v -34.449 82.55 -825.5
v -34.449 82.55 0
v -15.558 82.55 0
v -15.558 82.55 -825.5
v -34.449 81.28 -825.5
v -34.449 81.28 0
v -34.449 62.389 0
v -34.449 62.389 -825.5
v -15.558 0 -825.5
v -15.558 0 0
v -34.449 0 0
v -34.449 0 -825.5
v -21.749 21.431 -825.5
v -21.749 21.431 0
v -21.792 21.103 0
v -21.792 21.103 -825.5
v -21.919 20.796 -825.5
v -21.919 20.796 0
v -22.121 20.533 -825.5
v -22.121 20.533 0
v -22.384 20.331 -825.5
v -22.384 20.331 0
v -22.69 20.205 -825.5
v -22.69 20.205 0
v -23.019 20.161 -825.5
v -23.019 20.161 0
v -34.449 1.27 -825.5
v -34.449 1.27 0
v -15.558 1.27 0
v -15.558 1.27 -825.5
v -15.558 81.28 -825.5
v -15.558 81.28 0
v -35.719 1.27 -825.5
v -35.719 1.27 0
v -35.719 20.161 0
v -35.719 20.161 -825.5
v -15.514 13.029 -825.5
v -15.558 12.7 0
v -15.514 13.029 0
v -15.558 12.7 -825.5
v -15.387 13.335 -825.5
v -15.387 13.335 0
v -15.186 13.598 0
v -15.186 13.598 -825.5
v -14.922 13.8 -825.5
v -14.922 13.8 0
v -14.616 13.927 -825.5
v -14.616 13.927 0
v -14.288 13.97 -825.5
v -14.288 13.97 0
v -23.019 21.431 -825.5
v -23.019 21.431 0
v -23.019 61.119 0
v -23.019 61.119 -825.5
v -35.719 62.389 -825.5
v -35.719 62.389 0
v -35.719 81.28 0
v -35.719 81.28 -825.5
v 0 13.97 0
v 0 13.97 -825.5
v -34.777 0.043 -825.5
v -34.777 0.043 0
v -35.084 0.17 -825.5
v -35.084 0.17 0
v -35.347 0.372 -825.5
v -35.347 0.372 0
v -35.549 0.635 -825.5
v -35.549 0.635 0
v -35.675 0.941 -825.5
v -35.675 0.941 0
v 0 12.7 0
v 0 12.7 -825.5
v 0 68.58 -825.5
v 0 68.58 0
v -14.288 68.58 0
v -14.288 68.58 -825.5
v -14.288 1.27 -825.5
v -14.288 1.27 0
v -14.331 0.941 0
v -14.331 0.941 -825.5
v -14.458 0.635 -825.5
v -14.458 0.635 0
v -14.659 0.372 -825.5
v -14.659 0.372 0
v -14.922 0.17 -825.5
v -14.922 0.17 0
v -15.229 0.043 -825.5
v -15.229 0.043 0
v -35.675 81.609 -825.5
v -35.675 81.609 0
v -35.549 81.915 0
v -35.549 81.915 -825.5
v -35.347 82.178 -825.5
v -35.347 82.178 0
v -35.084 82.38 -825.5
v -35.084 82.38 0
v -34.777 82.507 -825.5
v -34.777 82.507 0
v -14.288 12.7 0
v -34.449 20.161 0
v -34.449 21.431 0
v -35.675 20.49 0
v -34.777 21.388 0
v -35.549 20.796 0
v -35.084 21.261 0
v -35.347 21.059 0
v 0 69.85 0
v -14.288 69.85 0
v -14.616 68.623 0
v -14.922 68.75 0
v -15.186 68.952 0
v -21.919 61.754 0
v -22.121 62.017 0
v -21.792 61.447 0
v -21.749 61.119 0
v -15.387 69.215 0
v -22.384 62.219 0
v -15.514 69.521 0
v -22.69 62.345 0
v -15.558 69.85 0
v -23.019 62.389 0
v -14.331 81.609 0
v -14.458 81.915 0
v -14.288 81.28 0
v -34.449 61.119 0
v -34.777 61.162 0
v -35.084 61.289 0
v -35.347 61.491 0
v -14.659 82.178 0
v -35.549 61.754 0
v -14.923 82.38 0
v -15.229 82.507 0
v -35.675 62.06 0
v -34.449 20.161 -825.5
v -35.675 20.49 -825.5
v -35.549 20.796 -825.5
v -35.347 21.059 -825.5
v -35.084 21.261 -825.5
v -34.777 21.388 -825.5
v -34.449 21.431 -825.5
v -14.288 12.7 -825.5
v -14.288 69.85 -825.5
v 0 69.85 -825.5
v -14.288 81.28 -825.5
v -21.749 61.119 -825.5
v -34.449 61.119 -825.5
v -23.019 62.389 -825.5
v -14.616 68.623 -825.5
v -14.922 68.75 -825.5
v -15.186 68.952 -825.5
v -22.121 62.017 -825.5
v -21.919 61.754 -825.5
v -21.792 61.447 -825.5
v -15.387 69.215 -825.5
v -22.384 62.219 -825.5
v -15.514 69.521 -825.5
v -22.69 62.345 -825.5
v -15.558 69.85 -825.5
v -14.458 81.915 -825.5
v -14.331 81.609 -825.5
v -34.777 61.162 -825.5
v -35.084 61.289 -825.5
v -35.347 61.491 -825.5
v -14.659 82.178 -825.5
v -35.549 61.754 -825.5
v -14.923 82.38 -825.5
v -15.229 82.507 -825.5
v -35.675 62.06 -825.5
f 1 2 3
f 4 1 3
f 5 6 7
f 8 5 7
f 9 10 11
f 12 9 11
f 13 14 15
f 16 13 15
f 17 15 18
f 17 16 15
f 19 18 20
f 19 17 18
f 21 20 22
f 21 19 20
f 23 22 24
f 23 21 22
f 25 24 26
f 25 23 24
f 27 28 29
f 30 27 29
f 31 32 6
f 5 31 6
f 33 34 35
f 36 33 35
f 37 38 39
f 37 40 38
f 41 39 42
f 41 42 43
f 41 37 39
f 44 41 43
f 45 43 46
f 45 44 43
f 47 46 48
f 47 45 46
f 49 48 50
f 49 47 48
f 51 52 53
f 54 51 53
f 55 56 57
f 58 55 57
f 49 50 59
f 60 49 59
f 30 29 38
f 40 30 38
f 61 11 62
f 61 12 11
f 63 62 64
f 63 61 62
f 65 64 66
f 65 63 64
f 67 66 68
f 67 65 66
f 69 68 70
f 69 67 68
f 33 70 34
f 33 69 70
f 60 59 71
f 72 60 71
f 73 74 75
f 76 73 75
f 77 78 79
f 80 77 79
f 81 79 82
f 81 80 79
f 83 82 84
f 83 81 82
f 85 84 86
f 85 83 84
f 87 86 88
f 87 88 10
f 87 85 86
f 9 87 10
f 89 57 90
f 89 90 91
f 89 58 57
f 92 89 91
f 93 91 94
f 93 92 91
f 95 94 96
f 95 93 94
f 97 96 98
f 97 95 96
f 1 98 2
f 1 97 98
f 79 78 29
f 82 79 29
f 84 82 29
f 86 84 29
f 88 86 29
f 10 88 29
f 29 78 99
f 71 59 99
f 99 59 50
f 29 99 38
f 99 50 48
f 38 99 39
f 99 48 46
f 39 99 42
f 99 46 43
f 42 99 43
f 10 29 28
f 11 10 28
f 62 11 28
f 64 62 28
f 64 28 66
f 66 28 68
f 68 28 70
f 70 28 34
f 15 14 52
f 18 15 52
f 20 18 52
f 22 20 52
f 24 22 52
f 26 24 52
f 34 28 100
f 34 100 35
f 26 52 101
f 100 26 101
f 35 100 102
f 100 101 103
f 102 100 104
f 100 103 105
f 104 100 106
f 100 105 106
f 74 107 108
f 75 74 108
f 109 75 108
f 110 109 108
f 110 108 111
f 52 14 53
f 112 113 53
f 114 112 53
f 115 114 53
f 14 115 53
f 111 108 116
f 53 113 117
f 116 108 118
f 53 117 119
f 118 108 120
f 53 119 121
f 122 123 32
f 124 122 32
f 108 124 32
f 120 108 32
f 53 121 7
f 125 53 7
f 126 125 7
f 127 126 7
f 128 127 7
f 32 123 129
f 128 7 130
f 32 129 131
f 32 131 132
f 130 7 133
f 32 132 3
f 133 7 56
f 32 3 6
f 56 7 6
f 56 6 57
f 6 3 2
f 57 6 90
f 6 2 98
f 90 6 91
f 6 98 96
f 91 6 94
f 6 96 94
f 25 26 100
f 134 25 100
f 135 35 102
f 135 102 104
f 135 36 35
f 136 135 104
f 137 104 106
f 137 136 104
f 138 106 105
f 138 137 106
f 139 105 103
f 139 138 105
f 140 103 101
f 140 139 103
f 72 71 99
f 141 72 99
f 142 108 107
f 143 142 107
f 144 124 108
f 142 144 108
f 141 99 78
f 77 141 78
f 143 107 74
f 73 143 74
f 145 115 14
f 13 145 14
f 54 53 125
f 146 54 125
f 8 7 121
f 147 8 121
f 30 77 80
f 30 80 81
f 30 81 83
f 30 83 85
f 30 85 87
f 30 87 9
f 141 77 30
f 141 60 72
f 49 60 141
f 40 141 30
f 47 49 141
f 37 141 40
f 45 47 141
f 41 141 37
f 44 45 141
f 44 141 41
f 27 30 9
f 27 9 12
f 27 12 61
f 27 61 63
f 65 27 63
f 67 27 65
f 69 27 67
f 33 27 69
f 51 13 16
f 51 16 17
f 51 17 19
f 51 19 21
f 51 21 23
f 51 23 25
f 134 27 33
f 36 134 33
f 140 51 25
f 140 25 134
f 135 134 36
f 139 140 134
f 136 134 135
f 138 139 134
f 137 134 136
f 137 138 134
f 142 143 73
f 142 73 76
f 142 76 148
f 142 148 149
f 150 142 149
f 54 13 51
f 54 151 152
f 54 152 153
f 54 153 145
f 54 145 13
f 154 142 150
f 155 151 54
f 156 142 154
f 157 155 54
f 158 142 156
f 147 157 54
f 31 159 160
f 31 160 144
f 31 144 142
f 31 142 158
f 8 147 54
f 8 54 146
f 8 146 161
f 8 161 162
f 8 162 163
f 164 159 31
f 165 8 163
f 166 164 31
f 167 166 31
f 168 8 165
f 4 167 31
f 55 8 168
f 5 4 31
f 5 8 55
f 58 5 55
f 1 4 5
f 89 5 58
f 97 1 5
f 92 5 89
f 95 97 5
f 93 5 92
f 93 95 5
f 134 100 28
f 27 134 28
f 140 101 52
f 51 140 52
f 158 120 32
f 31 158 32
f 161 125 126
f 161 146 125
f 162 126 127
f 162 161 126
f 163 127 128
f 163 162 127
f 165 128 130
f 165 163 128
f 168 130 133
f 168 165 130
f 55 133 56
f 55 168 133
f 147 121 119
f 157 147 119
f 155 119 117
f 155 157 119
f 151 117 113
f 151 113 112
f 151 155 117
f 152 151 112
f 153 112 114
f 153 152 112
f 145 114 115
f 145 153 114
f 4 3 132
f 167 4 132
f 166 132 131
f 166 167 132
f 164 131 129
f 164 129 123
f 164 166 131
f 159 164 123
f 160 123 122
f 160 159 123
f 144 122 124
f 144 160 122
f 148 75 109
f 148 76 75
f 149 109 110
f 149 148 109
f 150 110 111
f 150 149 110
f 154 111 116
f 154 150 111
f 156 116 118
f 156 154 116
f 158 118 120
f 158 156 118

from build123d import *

# Parameters (mm, degrees)
BOSS_EXTRUDE1_DEPTH = 825.5
FILLET1_R           = 1.27


with BuildPart() as part:
    # Sketch1 → Boss-Extrude1 (new body)
    with BuildSketch(Plane.XY):
        Polygon((0, 12.7), (-14.2875, 12.7), (-14.2875, 0), (-35.71875, 0), (-35.71875, 21.43125), (-23.01875, 21.43125), (-23.01875, 61.11875), (-35.71875, 61.11875), (-35.71875, 82.55), (-14.2875, 82.55), (-14.2875, 69.85), (0, 69.85), (0, 68.58), (-15.5575, 68.58), (-15.5575, 81.28), (-34.44875, 81.28), (-34.44875, 62.38875), (-21.74875, 62.38875), (-21.74875, 20.16125), (-34.44875, 20.16125), (-34.44875, 1.27), (-15.5575, 1.27), (-15.5575, 13.97), (0, 13.97), align=None)
    extrude(amount=-BOSS_EXTRUDE1_DEPTH)

    # Fillet1
    fillet1_edges = [part.edges().sort_by_distance(p)[0] for p in [
        (-14.2875, 0, -412.75),
        (-35.71875, 0, -412.75),
        (-35.71875, 21.43125, -412.75),
        (-35.71875, 61.11875, -412.75),
        (-35.71875, 82.55, -412.75),
        (-14.2875, 82.55, -412.75),
        (-15.5575, 68.58, -412.75),
        (-21.74875, 62.38875, -412.75),
        (-21.74875, 20.16125, -412.75),
        (-15.5575, 13.97, -412.75),
    ]]
    fillet(fillet1_edges, radius=FILLET1_R)


solid = part.part
